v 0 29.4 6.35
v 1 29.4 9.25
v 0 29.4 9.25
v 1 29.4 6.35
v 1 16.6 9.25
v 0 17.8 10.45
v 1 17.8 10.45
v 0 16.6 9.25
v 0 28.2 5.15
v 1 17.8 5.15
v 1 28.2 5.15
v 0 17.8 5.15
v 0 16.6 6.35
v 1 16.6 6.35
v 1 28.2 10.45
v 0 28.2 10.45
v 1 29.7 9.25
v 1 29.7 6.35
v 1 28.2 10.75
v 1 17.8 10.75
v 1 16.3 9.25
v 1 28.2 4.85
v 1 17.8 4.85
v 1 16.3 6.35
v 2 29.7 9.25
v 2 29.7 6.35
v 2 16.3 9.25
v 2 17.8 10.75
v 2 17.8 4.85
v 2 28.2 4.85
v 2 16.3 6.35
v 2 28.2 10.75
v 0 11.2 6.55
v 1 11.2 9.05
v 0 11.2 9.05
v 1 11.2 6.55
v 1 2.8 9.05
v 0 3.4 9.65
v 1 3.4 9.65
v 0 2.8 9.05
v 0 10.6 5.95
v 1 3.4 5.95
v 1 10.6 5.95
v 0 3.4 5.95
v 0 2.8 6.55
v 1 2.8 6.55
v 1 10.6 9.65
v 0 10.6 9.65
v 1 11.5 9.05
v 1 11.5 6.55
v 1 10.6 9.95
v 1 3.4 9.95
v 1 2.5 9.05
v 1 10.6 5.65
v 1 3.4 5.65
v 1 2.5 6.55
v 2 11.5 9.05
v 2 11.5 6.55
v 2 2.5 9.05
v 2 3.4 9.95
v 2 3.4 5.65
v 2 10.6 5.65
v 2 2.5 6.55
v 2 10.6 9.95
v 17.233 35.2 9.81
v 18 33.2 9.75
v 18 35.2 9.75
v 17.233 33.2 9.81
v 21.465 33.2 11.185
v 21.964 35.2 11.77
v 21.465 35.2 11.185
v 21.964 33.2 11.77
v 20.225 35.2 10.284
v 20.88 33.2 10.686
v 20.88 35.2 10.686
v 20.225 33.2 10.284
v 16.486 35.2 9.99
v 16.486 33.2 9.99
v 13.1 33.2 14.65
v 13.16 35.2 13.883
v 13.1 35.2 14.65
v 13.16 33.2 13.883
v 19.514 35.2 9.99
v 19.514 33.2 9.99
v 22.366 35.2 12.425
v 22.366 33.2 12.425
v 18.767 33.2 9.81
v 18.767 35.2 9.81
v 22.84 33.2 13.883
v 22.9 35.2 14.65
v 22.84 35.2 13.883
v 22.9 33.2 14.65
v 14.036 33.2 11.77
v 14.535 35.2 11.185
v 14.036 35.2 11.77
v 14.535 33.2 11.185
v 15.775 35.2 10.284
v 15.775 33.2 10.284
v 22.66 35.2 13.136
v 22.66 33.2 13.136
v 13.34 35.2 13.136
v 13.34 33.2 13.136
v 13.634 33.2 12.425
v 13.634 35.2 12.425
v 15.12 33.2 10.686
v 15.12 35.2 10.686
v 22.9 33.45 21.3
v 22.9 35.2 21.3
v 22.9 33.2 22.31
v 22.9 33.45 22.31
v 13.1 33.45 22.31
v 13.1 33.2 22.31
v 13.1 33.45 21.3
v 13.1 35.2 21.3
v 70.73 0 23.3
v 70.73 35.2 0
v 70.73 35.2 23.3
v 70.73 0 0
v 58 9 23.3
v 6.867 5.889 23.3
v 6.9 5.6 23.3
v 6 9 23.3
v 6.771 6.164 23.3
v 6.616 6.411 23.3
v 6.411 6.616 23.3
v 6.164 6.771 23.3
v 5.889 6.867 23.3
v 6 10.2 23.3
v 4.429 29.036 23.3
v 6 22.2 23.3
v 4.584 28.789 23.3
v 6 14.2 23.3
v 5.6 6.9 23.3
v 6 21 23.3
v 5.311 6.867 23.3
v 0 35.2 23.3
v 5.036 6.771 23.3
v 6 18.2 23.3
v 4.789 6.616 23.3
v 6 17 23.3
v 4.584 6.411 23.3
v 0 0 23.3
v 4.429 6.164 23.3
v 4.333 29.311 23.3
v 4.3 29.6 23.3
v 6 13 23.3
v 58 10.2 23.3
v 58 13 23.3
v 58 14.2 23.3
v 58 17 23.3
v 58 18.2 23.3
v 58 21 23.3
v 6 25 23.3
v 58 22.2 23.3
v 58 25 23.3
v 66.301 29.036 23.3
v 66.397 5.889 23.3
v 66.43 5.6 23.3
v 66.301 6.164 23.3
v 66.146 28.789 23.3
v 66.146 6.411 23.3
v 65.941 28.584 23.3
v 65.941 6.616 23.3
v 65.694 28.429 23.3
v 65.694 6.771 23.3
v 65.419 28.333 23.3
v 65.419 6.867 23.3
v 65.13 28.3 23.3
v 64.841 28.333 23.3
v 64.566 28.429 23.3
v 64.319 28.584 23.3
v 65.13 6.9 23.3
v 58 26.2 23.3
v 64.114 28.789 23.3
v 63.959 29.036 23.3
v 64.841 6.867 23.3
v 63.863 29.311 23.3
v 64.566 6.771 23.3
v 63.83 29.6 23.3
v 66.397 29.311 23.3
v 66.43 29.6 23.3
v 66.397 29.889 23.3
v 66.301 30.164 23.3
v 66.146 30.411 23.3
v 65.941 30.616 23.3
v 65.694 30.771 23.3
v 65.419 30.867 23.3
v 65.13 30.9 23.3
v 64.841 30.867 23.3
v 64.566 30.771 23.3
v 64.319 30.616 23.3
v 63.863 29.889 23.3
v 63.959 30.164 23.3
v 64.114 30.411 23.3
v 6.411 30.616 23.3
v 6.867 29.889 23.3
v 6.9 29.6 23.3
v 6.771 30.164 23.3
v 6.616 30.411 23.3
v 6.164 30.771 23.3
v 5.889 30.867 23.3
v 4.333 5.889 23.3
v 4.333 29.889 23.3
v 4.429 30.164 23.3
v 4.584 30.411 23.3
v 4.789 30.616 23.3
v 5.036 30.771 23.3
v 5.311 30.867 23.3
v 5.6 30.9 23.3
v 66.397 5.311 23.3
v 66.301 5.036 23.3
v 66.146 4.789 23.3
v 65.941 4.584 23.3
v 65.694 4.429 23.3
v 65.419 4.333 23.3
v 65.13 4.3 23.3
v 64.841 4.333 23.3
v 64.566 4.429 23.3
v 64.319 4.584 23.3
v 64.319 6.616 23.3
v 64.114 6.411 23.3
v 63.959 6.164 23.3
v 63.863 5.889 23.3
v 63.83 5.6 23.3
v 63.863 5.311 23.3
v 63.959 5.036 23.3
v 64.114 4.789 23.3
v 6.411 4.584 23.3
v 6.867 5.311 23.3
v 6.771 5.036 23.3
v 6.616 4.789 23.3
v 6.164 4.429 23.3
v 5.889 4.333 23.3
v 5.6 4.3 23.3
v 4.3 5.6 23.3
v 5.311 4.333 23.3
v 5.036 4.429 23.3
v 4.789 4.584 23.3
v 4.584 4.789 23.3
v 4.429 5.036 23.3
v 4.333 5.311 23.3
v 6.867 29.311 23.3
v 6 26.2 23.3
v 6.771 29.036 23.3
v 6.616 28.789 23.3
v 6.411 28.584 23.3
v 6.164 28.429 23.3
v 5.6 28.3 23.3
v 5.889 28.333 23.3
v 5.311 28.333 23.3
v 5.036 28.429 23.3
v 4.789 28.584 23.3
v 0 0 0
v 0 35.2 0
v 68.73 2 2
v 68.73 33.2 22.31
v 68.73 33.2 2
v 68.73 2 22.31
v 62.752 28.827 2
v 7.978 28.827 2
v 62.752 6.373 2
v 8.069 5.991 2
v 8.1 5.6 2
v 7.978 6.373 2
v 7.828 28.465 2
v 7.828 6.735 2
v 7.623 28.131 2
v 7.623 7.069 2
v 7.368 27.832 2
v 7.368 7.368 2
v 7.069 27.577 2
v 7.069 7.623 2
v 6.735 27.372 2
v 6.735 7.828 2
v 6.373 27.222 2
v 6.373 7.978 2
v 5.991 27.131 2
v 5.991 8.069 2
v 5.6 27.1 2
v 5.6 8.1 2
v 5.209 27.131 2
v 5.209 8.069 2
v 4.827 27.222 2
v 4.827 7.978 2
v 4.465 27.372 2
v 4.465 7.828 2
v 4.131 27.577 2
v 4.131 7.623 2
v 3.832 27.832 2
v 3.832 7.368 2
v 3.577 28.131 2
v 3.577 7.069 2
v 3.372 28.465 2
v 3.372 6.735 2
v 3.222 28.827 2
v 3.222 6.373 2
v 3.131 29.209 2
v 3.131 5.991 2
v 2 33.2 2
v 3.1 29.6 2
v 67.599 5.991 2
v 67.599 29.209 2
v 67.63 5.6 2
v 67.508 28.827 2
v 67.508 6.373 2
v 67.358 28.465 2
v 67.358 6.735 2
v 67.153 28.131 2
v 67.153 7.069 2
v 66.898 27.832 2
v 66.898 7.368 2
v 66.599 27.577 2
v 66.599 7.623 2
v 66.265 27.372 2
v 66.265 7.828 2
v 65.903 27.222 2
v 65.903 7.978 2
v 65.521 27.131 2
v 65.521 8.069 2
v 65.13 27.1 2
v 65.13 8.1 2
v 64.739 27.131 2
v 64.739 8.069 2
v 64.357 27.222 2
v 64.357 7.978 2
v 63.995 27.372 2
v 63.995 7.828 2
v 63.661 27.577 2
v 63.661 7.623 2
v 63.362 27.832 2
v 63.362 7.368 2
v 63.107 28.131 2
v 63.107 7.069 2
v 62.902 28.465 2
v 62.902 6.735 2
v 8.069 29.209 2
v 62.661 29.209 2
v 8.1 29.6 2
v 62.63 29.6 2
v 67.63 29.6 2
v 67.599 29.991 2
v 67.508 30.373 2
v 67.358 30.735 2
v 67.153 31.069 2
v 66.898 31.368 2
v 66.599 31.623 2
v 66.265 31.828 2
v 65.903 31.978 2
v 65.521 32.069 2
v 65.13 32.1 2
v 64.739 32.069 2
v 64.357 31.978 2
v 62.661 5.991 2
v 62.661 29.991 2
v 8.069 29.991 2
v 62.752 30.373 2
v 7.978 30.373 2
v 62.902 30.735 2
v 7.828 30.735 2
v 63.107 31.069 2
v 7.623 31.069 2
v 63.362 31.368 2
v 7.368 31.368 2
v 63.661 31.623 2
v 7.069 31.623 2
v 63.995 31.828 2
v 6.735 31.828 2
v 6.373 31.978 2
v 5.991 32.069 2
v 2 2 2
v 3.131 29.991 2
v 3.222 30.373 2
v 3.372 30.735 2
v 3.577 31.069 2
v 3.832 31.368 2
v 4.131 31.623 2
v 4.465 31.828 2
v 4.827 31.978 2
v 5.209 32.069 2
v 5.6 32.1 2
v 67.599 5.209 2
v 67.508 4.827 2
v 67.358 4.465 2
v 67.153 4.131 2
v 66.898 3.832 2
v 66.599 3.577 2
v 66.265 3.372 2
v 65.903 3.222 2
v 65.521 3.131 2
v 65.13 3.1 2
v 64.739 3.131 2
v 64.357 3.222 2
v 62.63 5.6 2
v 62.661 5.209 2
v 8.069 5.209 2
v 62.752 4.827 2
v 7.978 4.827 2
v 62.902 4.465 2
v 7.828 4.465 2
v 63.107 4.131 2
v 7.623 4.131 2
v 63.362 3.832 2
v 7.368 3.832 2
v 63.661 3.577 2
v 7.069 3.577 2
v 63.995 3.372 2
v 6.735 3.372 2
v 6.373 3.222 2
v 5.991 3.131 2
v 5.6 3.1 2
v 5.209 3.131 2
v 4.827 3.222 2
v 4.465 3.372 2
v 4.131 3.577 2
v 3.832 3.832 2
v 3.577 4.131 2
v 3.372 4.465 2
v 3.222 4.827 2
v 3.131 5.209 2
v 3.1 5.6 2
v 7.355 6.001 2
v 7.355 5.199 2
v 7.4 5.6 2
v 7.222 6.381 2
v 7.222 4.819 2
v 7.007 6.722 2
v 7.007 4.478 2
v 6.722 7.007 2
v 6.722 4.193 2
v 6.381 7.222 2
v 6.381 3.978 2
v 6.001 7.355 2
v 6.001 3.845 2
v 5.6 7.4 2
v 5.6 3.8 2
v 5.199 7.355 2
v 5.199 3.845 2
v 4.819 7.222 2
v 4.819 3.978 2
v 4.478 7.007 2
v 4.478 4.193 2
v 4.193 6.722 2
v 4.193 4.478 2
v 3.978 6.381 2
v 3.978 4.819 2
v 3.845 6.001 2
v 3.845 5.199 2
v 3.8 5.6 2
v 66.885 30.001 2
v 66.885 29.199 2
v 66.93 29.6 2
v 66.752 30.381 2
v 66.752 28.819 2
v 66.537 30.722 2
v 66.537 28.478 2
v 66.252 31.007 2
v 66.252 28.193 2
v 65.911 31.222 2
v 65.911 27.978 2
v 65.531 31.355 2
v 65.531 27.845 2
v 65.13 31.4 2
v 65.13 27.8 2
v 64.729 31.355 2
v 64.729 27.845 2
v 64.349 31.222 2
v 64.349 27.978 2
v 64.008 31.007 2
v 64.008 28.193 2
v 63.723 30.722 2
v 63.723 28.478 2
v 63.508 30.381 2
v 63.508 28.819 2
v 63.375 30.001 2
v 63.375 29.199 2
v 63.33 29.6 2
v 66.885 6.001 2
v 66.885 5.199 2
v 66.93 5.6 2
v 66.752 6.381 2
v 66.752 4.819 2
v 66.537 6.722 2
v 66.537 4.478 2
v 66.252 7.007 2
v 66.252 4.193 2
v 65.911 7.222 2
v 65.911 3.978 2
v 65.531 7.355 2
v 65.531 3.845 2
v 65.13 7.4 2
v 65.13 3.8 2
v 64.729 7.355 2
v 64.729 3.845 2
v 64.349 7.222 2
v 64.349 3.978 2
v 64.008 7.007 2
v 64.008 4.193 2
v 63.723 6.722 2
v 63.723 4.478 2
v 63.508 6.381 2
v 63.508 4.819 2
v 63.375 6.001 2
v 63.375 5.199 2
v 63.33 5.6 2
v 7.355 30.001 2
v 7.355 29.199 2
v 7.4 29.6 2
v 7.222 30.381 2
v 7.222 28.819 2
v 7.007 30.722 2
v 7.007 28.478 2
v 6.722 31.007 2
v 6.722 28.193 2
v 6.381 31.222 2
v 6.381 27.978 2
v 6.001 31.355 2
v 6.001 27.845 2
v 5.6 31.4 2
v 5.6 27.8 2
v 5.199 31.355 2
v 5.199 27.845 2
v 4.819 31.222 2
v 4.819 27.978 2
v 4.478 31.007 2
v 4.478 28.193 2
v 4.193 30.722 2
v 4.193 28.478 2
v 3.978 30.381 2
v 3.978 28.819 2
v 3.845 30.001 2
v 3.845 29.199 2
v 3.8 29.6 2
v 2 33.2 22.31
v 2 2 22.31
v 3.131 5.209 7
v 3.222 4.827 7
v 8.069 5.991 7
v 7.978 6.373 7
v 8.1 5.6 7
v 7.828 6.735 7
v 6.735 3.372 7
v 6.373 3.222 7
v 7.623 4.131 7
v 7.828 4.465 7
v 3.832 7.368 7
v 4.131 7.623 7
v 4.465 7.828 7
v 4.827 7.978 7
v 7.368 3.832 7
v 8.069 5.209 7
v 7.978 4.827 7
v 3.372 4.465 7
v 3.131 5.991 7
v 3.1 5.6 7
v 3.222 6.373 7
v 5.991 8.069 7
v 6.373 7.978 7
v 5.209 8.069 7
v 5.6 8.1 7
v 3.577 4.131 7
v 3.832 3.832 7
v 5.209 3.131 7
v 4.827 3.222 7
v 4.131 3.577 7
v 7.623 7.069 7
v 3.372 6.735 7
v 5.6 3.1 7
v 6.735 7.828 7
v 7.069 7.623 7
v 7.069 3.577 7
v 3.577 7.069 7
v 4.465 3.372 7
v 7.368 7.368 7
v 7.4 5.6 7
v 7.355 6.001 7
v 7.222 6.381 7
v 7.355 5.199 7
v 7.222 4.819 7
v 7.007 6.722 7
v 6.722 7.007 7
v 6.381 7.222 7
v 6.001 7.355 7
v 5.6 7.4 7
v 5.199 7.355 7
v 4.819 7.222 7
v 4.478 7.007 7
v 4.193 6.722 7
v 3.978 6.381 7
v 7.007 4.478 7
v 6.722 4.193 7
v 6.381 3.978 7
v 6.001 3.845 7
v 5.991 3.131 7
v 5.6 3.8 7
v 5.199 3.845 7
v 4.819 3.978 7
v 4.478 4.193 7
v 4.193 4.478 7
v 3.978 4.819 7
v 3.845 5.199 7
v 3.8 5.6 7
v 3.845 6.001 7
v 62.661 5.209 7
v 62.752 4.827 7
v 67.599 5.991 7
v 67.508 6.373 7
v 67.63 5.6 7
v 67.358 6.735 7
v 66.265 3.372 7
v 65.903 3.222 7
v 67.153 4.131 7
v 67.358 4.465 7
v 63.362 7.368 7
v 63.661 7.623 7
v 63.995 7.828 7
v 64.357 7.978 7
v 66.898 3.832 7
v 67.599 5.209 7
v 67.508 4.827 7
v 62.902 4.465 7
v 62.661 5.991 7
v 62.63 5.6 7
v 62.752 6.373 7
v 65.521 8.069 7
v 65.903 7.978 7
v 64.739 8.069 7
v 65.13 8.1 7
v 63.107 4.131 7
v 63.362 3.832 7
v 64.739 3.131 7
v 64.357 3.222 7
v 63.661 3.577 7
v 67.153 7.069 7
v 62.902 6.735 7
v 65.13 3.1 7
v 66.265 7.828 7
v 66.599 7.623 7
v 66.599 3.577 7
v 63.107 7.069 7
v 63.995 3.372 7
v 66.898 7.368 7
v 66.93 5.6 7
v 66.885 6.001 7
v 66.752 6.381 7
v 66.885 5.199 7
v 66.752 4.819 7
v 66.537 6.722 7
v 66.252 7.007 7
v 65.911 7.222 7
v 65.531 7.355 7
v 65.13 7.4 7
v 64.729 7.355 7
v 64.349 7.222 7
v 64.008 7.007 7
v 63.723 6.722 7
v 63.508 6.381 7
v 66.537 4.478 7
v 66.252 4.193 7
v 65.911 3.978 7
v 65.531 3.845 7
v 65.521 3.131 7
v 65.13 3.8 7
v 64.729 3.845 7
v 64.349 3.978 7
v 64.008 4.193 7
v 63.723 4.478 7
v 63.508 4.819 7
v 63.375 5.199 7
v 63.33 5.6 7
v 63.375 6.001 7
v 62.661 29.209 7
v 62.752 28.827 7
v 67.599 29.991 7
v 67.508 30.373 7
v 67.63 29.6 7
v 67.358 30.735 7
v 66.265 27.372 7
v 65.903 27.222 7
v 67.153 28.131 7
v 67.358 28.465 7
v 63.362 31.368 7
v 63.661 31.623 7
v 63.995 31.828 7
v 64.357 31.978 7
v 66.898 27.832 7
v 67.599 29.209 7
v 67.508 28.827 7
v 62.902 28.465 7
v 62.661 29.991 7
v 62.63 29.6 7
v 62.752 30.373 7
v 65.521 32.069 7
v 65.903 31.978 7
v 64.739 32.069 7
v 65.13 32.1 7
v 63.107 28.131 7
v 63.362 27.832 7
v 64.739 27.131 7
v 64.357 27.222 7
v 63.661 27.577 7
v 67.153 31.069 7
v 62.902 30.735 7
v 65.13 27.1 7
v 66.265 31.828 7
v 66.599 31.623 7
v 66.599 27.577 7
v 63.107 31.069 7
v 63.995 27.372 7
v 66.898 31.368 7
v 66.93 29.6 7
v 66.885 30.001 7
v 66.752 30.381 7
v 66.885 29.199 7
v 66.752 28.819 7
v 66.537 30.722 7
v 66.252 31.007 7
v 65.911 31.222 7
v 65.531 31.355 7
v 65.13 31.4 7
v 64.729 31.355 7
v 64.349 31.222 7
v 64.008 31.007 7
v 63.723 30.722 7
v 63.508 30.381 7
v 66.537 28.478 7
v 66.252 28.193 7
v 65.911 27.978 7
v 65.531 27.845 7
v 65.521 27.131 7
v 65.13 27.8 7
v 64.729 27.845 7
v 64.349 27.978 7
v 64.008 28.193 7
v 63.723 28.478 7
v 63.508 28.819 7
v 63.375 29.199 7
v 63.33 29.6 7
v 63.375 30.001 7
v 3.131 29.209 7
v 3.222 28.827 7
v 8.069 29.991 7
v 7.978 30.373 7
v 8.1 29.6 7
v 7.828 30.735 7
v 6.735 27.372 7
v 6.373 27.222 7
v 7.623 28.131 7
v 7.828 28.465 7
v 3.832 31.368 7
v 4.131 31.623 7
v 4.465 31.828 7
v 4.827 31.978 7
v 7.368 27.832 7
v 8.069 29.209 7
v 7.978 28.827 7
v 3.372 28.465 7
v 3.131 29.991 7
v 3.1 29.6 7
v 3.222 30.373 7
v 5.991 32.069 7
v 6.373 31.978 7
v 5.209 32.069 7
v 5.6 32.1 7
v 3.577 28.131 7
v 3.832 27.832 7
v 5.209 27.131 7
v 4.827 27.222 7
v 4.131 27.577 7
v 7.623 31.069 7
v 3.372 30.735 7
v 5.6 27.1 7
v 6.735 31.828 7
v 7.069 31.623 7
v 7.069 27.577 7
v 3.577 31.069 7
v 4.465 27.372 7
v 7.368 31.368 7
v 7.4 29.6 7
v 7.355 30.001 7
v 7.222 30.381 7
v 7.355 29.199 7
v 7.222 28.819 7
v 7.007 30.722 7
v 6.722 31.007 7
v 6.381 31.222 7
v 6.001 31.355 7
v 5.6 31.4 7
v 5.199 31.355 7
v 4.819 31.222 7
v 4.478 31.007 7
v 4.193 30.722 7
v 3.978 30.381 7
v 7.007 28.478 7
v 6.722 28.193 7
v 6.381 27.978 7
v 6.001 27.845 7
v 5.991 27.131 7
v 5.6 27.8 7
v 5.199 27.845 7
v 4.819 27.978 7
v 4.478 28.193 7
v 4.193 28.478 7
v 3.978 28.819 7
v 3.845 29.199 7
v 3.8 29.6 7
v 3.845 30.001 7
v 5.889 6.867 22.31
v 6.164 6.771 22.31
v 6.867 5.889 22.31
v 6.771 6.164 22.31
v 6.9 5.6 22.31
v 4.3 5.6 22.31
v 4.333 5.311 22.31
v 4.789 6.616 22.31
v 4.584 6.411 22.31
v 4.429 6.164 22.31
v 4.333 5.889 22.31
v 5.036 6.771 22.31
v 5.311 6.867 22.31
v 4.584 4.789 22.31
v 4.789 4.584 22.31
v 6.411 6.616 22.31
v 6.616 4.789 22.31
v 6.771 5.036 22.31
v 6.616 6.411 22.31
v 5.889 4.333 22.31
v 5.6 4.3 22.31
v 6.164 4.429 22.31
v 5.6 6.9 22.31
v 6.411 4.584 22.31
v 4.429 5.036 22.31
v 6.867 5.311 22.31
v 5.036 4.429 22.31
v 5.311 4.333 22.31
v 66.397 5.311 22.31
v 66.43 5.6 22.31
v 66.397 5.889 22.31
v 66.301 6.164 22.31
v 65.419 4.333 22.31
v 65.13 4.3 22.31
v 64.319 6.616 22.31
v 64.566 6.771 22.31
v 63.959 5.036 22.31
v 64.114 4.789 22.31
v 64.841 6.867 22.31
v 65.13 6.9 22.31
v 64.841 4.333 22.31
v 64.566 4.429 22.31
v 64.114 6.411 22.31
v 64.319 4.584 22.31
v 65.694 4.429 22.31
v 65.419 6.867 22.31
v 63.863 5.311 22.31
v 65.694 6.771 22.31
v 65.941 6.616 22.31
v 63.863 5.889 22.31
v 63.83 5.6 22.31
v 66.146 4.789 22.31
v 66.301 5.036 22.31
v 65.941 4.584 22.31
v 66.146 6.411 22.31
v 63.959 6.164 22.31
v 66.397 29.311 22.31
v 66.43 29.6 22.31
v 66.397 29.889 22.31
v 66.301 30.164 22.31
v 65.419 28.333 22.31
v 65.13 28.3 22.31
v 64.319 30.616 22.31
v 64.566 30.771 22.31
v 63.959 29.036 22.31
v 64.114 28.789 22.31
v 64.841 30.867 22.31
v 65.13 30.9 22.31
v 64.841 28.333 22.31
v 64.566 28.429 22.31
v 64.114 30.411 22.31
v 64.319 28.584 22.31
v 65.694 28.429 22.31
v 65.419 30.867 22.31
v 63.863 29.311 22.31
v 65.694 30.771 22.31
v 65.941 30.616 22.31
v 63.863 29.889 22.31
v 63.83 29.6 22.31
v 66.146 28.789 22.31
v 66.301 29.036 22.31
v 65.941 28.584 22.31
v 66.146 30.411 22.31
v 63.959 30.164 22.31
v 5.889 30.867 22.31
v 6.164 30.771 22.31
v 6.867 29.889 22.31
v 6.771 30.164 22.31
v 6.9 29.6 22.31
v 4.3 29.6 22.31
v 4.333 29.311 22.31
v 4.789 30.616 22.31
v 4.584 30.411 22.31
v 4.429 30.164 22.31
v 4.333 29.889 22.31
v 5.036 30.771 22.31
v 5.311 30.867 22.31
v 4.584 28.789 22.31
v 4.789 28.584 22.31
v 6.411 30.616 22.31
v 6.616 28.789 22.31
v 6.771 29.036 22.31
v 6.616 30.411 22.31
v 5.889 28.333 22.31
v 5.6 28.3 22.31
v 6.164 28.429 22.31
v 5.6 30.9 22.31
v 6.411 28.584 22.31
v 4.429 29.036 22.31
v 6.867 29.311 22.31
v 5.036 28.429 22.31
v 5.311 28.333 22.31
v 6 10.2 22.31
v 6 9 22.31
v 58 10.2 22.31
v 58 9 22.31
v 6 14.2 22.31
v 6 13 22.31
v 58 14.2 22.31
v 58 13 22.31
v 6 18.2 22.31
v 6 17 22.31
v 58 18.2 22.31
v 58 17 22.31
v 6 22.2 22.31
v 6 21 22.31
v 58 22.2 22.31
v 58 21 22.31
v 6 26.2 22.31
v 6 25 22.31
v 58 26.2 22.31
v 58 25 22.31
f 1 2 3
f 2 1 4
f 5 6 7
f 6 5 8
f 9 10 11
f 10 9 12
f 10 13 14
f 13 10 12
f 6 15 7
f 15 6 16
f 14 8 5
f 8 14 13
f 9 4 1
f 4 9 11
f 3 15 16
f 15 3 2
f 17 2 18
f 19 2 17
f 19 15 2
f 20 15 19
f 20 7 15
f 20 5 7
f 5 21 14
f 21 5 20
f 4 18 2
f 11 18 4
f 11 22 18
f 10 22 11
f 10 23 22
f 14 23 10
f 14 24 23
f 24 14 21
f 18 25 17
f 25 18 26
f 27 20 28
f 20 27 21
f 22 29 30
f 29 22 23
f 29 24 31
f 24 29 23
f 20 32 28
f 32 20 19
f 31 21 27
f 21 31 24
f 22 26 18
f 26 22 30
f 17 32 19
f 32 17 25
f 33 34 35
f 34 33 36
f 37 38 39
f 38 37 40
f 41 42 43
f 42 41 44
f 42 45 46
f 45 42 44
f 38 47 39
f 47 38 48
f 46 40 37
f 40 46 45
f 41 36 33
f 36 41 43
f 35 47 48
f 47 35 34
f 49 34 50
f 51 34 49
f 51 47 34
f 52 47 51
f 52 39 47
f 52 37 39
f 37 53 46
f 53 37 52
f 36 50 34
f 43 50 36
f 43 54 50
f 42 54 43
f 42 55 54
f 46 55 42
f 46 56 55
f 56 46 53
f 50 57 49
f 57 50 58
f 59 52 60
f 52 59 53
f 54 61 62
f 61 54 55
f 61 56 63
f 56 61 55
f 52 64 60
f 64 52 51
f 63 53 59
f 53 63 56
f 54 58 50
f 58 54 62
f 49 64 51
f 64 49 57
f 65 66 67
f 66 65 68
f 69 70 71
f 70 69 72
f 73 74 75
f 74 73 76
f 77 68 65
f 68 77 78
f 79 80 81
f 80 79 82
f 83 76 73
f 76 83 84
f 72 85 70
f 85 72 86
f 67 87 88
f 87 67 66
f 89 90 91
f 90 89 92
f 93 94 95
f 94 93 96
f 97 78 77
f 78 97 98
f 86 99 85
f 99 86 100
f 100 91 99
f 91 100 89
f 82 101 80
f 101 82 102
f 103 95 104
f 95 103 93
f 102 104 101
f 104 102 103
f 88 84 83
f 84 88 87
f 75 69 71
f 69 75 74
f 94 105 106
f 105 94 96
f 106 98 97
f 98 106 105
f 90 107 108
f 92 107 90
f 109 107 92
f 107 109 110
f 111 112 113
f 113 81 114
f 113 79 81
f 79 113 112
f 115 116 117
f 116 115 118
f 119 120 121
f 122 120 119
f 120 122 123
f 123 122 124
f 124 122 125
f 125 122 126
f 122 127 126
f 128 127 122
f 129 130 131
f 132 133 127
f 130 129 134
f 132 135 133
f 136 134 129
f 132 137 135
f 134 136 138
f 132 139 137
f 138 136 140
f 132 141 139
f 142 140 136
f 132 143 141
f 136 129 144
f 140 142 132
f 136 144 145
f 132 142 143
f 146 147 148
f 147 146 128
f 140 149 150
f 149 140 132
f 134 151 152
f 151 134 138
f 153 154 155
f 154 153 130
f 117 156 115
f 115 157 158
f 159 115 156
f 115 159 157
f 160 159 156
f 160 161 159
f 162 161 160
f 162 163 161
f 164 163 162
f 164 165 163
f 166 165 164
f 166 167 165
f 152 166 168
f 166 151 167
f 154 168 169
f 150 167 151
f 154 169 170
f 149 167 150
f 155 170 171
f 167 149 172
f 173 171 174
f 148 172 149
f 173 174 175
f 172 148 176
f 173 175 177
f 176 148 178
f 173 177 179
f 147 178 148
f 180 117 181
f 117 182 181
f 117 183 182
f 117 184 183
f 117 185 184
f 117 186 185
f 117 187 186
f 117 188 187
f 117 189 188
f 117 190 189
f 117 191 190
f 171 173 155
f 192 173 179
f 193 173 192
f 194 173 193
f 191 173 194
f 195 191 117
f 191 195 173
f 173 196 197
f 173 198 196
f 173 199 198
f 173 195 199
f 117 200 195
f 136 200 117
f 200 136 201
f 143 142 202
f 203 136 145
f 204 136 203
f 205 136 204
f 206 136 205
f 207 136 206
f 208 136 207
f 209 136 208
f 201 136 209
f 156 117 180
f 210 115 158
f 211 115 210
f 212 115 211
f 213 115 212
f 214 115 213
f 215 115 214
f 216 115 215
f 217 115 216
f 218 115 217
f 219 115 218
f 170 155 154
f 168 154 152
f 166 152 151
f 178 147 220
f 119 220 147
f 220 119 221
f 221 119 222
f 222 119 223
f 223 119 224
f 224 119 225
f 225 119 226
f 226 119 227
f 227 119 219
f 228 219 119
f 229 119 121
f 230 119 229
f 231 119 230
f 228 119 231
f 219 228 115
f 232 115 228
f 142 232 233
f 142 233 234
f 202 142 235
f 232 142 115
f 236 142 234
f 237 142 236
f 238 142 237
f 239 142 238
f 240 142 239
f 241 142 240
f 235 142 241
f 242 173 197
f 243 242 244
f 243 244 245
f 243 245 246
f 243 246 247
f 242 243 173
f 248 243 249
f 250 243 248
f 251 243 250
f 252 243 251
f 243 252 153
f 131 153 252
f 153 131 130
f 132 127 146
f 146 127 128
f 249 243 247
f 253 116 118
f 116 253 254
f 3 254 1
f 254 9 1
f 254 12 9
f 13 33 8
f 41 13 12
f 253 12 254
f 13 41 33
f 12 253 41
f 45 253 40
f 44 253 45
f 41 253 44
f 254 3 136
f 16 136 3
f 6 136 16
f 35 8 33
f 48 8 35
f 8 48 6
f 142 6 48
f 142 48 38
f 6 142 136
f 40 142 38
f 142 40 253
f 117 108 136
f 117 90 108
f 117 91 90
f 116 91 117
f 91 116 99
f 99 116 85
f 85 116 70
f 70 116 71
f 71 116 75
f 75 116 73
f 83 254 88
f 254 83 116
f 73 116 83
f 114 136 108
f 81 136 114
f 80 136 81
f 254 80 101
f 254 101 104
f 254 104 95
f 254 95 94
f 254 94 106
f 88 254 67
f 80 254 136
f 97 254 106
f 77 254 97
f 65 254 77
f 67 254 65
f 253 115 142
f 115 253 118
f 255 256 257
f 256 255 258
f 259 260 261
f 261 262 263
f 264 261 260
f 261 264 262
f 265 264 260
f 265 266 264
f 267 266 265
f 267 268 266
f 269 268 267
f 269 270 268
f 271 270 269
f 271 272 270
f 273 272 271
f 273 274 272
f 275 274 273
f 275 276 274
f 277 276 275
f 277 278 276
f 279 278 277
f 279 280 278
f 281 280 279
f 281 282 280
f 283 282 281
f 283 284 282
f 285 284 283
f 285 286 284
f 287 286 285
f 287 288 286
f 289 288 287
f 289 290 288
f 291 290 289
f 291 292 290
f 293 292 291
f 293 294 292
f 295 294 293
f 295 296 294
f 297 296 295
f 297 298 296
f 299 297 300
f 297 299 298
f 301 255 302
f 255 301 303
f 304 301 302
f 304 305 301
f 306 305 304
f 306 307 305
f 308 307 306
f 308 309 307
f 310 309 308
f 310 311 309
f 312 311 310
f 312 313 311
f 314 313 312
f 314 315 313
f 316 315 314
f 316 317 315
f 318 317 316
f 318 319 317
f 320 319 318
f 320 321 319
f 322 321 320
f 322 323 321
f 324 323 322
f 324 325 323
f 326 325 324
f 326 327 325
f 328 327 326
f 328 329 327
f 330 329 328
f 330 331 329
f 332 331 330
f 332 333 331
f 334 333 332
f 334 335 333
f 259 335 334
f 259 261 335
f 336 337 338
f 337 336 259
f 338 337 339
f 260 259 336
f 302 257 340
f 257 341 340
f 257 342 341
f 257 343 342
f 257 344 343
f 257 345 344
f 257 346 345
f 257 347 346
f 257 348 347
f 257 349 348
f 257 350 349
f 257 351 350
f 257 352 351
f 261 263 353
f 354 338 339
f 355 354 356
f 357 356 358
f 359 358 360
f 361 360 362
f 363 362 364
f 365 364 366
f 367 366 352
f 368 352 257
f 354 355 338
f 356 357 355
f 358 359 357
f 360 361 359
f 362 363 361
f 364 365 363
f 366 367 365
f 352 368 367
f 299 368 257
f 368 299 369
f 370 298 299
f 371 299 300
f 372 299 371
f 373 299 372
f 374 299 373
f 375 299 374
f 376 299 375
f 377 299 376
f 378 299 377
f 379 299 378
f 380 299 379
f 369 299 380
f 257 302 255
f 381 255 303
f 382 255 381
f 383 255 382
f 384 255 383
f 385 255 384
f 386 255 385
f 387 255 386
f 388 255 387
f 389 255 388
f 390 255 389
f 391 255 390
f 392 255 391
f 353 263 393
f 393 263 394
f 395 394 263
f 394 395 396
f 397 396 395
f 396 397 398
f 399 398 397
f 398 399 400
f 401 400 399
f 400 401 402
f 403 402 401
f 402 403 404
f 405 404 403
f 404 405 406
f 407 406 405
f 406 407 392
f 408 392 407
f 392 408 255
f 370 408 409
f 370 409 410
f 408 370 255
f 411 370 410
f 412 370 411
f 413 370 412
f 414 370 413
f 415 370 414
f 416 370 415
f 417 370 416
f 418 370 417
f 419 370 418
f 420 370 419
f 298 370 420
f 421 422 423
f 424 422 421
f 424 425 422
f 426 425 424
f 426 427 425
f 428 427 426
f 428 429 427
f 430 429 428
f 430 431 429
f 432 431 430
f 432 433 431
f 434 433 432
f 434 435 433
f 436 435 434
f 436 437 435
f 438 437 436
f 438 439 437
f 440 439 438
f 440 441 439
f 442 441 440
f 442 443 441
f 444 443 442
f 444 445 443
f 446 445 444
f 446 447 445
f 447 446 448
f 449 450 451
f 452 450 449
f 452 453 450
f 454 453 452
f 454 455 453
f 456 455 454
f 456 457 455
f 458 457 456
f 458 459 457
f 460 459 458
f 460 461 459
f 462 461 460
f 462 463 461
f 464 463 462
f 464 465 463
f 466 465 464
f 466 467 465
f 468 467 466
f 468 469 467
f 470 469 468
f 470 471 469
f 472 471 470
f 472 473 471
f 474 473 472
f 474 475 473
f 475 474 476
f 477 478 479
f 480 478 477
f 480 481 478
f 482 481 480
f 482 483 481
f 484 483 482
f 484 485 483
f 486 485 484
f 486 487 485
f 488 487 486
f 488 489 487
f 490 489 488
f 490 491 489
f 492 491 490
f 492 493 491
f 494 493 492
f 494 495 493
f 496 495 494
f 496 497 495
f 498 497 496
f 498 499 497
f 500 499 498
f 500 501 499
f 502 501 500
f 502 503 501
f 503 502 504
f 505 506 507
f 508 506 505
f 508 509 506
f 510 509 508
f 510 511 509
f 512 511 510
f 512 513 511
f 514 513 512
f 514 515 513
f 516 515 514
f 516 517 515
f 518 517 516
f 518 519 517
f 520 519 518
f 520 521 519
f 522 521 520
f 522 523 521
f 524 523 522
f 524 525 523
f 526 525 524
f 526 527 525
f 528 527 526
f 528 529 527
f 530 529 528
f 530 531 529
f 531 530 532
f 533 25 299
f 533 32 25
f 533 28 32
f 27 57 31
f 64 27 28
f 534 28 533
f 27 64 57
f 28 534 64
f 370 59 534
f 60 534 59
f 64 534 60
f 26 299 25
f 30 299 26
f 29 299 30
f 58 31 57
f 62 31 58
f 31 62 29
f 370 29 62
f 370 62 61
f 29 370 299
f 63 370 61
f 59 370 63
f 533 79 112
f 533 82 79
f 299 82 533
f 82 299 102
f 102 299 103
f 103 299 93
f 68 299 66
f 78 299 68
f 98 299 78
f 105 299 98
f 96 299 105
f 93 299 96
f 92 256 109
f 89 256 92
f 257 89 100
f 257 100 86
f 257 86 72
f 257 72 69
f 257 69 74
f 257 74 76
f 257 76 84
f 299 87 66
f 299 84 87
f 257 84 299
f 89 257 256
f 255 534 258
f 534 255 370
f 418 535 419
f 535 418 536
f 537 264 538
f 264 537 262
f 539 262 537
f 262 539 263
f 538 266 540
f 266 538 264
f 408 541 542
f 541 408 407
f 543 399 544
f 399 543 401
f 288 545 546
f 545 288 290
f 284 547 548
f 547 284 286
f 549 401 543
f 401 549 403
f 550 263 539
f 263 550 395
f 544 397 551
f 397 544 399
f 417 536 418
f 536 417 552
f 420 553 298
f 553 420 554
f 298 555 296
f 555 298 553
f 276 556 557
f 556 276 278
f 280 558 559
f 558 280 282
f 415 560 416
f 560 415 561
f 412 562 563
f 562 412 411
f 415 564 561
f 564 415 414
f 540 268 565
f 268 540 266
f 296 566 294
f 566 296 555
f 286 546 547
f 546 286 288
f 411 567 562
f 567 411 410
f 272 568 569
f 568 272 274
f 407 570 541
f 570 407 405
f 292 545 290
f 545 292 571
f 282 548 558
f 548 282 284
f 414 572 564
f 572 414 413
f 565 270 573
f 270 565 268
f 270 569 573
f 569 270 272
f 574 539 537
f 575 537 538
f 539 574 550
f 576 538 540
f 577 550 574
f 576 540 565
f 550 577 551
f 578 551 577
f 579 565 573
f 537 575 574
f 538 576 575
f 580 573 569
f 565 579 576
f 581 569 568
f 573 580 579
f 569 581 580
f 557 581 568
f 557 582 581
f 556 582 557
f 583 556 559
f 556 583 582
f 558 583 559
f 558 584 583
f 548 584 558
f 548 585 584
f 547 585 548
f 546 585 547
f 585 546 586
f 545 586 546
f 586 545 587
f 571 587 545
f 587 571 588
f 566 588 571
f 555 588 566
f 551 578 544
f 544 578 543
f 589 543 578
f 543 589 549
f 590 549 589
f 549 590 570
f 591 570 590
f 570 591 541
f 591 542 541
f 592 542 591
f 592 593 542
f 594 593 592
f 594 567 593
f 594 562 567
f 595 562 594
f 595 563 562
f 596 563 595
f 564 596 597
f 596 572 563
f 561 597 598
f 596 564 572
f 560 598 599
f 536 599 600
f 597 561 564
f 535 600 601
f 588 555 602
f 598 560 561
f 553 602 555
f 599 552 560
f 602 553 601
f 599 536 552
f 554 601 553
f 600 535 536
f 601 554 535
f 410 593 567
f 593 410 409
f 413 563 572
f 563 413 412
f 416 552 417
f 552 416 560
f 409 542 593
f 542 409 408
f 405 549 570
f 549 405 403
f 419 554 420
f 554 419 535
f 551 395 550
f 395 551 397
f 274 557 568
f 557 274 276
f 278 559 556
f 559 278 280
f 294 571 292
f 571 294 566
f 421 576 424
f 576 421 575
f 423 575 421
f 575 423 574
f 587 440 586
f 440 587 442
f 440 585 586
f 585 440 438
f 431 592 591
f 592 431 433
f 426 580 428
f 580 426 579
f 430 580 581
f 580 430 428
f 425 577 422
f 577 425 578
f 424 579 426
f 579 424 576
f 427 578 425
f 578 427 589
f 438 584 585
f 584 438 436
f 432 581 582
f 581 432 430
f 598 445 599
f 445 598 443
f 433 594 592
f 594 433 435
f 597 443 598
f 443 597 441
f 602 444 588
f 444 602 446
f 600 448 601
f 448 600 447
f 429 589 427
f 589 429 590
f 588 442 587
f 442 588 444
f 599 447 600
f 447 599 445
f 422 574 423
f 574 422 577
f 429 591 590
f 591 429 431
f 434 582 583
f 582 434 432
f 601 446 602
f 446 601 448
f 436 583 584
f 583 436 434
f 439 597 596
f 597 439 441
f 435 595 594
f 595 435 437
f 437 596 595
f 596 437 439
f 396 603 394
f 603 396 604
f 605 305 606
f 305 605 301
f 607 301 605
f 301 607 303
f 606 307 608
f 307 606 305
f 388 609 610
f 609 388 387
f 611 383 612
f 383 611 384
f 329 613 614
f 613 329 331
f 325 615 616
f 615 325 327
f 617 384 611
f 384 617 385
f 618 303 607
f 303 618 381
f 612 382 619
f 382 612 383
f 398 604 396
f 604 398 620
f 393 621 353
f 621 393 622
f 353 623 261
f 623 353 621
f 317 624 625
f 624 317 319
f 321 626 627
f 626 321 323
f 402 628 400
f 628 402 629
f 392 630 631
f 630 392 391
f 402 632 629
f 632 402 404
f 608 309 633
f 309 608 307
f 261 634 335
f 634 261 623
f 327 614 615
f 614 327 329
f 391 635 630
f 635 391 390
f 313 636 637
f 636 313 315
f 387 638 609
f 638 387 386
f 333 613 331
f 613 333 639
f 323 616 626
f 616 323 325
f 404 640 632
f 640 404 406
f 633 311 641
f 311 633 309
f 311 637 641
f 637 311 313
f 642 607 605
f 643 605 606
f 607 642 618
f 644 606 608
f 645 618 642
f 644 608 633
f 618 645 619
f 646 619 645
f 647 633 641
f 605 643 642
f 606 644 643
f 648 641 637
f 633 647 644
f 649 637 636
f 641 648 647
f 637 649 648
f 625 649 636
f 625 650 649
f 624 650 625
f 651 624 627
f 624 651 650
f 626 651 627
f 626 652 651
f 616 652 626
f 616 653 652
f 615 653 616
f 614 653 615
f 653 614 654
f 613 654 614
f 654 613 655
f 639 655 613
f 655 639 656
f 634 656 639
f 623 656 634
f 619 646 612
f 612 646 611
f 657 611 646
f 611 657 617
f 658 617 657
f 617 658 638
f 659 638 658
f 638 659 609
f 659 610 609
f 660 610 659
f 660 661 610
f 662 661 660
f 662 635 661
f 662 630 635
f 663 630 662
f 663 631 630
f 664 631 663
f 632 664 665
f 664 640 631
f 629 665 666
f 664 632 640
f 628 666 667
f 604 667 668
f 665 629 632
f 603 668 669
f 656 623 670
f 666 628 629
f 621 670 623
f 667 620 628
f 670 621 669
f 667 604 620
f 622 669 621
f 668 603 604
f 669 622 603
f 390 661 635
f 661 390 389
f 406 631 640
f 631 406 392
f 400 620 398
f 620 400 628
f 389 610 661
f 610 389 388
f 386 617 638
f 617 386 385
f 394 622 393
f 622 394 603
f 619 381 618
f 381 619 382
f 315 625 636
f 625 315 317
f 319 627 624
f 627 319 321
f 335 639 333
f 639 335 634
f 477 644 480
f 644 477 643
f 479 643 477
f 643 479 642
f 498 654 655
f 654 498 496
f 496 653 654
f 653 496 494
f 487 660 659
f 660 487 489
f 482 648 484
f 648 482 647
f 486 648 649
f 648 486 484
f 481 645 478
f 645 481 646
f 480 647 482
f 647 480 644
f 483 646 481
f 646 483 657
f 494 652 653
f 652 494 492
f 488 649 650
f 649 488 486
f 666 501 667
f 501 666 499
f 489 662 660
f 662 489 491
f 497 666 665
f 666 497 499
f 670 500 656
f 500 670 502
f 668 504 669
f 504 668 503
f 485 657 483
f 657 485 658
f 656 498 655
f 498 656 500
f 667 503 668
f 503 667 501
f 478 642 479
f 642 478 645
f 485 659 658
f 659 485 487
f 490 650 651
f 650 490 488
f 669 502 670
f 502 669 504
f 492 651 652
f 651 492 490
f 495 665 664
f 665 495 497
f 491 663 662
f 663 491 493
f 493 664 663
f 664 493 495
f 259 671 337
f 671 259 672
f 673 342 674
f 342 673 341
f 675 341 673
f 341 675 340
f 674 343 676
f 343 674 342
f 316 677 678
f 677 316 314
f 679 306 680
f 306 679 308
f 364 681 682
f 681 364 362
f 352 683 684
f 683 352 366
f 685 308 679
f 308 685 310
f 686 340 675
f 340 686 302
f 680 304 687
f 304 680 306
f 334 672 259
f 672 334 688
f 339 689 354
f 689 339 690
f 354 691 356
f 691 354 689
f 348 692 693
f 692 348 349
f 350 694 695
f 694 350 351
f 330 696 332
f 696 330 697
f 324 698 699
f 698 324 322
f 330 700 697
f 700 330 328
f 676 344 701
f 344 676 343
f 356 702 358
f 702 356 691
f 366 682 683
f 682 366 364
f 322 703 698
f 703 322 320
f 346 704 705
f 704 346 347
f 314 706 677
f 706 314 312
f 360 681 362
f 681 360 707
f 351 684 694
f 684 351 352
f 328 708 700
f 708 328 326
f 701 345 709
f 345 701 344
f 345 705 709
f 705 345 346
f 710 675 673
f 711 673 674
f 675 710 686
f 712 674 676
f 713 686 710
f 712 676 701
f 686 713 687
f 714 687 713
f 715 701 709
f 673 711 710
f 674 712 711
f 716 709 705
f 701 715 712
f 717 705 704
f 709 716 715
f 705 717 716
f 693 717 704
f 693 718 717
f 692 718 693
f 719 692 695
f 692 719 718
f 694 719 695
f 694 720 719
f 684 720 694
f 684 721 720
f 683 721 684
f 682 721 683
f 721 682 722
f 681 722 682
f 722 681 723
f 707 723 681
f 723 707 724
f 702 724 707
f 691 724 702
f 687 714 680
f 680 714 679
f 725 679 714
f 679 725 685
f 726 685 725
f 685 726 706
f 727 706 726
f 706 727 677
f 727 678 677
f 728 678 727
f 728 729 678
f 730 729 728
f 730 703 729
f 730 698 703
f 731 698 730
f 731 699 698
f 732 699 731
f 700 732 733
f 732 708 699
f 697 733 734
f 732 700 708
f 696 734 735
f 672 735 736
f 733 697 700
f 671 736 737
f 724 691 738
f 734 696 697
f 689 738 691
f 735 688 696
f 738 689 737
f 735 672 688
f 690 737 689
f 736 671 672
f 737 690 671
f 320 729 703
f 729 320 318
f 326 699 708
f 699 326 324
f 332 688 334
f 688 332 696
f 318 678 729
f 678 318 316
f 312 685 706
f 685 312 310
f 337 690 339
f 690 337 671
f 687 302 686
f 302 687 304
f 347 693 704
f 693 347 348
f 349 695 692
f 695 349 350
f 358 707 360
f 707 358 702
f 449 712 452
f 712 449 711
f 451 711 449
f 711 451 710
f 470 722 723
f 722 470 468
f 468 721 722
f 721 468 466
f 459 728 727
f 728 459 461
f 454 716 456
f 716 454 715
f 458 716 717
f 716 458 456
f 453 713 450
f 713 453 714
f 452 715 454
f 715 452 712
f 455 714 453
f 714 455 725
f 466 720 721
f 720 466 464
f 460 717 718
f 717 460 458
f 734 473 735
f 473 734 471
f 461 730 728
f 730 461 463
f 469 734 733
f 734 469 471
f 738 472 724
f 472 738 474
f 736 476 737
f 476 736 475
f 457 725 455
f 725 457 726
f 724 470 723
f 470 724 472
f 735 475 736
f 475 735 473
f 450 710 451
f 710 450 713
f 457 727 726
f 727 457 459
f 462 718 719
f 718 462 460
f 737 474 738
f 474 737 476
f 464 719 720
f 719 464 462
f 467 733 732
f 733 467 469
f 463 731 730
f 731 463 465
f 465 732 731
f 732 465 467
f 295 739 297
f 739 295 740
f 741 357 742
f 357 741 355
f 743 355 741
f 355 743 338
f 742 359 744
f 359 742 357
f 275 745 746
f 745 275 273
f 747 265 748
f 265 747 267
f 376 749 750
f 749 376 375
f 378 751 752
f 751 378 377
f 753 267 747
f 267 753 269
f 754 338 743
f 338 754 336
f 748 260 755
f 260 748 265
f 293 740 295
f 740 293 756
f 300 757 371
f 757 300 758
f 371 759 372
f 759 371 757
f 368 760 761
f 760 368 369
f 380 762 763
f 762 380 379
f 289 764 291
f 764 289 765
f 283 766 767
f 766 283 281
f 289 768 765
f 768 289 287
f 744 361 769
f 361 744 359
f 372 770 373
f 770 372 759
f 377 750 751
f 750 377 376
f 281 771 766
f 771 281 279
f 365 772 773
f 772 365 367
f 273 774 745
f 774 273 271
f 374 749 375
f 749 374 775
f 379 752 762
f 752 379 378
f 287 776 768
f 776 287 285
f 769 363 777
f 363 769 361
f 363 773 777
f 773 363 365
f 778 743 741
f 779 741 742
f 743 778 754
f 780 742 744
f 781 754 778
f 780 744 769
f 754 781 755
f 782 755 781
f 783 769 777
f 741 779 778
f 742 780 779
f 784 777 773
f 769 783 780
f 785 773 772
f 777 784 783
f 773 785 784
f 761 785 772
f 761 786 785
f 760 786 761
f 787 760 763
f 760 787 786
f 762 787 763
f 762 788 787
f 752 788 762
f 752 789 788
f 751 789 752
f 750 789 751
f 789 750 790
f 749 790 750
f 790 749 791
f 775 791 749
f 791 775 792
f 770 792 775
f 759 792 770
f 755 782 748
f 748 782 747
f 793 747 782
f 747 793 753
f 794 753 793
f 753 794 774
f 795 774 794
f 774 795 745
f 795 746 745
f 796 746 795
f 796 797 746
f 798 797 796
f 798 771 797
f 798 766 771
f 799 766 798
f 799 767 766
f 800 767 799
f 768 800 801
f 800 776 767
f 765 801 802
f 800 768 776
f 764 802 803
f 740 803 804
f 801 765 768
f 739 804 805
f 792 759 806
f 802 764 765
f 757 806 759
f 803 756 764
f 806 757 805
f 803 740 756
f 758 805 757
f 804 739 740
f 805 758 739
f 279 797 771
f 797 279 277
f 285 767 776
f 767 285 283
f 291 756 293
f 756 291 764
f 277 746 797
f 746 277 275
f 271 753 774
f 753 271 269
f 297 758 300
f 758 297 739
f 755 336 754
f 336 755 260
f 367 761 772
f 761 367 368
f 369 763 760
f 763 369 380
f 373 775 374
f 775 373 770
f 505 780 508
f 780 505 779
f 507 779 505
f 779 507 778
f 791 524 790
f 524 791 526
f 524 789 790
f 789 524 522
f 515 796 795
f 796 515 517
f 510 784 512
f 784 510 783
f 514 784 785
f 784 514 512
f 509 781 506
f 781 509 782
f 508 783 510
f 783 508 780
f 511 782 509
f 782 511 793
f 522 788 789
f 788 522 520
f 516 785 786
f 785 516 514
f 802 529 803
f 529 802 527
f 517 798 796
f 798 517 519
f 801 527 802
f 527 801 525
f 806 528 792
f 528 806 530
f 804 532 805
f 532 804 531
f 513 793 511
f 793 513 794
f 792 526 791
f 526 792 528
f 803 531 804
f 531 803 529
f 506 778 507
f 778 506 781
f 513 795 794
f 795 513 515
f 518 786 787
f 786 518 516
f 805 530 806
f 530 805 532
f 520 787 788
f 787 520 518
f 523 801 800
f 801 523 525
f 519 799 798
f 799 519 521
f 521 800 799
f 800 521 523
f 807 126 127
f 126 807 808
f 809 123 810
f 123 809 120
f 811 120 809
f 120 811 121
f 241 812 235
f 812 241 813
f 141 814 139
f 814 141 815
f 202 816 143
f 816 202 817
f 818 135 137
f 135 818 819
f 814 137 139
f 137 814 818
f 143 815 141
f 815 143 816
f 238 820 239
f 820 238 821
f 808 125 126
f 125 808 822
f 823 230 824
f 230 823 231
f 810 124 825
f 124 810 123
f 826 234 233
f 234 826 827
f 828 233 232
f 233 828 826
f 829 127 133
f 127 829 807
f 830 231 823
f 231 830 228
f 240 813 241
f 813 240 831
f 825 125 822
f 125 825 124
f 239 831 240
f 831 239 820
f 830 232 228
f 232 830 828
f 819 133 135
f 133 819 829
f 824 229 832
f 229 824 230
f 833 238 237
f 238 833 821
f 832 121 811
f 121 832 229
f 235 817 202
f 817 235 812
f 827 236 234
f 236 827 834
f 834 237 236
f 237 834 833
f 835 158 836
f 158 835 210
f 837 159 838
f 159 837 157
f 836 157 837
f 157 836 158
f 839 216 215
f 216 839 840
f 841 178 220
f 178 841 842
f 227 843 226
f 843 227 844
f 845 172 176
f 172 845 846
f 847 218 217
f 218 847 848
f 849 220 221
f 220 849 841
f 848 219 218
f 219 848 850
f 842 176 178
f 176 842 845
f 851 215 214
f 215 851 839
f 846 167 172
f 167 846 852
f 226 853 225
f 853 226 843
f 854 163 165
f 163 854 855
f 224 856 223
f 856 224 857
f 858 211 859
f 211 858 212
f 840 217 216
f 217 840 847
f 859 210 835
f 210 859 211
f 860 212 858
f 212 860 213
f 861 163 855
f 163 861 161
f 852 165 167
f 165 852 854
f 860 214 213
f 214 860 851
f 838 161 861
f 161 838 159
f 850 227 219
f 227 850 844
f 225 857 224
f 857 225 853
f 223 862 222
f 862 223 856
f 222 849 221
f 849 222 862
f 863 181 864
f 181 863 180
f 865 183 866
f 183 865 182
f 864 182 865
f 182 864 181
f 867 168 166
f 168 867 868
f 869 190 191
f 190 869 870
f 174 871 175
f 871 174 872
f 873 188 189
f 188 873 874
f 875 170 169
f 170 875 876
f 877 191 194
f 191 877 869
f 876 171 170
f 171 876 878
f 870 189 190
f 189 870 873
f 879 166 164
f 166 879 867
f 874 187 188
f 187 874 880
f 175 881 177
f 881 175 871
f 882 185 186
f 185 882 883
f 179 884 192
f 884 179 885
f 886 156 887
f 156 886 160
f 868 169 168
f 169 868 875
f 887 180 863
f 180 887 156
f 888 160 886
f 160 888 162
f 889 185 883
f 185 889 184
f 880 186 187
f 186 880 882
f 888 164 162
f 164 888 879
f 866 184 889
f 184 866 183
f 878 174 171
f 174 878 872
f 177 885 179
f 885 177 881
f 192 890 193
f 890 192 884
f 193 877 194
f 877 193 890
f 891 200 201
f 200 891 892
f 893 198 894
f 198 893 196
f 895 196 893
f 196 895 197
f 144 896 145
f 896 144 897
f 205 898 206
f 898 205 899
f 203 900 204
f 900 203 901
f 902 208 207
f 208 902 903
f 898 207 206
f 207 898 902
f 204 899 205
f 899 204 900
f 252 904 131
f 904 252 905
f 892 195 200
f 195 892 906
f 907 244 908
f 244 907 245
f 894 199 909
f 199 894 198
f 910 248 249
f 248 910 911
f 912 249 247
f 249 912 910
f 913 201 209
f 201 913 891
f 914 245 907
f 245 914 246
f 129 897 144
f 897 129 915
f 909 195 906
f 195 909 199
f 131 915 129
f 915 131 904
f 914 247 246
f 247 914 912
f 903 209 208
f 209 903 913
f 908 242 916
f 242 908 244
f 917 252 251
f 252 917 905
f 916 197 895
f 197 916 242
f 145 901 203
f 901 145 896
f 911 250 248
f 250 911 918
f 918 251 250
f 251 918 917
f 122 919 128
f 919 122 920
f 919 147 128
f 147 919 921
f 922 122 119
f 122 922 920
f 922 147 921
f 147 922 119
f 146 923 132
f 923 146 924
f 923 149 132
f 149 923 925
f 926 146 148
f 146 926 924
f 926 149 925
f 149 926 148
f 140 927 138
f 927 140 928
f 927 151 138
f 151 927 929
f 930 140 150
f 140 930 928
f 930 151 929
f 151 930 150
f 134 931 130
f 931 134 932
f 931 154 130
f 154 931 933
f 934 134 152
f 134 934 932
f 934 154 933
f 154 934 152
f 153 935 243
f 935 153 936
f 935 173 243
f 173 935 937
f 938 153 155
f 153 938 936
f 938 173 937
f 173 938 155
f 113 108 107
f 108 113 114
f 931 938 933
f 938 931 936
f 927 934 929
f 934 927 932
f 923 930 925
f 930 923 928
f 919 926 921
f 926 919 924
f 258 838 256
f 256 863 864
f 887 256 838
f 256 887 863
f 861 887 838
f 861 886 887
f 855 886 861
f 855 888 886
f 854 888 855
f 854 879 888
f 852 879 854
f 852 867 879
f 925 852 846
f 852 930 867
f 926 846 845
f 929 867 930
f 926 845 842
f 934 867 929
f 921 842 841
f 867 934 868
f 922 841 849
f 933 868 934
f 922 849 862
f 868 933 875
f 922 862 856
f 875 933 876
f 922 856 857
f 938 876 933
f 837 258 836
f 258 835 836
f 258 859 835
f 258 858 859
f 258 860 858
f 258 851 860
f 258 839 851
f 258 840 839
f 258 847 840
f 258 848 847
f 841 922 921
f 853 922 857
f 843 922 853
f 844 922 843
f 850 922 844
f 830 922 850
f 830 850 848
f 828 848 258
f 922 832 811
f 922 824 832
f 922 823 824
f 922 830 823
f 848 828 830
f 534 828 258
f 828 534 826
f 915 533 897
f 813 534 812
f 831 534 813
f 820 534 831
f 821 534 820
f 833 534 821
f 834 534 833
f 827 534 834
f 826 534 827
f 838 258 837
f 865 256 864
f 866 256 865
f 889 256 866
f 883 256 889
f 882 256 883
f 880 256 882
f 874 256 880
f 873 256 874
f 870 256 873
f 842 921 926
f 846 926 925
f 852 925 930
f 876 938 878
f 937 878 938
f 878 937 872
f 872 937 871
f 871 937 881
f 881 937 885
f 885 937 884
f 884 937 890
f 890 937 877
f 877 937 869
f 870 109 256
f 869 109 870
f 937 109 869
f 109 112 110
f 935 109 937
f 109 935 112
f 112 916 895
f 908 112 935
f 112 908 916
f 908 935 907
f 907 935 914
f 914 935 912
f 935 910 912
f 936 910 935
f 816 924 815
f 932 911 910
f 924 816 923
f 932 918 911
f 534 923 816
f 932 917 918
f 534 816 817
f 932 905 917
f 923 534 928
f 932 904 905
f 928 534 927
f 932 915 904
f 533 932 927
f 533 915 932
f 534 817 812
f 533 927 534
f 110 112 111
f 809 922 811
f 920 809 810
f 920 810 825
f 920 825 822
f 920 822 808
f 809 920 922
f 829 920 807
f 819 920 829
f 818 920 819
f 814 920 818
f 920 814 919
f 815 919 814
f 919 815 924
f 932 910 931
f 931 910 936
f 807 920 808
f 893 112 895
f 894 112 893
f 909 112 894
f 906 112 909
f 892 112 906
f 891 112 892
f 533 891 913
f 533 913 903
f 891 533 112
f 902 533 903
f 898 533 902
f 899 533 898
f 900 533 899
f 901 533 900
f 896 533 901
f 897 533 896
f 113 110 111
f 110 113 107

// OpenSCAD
//  SELECT PART  
PART = "both"; // ["bottom","top","both"]

//  MAIN PCB DIMENSIONS
board_len = 65.53;         // x
board_wid = 30;            // y
board_thk = 1.6;           // PCB thickness

// Tallest components (above PCB top / below PCB bottom)
comp_bottom = 3.0;
comp_top    = 12.1;        // approx 0.54" total - 1.6 mm PCB

//  PLASTIC THICKNESSES AND CLEARANCES 
wall  = 2.0;
floor = 2.0;
lid   = 2.0;

clear_xy = 0.6;            // side clearance
clear_z  = 0.6;            // vertical breathing room

//  USB PORT 1
// NOTE: "short" => long X wall; "long" => short Y wall (the PCB end)
usb_present = true;
usb_is_typeC = true;       // set false if you switch to USB A sizes
usb_side = "long";
usb_offset_from_left = 21;
usb_wall_clearance   = 0.40;

// USB PORT 2 (Micro USB)
usb2_present = true;
usb2_is_typeC = false;     // micro
usb2_side = "long";
usb2_offset_from_left = 5;
usb2_wall_clearance   = 0.40;

// USB shell sizes
usbC_w=12.0;  usbC_h=4.5;  usbC_depth=6.5;
micro_w=7.6; micro_h=2.9; micro_depth=6.0;

//  SMA ANTENNA 
antenna_bulkhead = true;
sma_on_short_side   = true;        // true => long X wall, false => short Y wall
sma_offset_from_left = 16;
sma_hole_d   = 7.8;                // close to barrel diameter
sma_pocket_d = sma_hole_d + 2;     // width of the U pocket (circle and slot)
sma_flat_clear = 11.0;             // kept for possible hex recess later

//  VENTING 
side_vents = false;
lid_vents  = true;
vent_slot  = [1.2, 12];
vent_pitch = 4.0;

//  LID LIP (filled lid with overlap) 
lid_rabbet_depth = 1.0;
lid_rabbet_clear = 0.25;

//  STANDOFFS AND MOUNTING 
standoff_h=5.0;
standoff_d=5.0;
insert_hole_d=3.6;         // for M2.5 heat set insert
through_hole_d=2.6;        // M2.5 clearance

hole_inset=3.0;
mount_holes=[
  [hole_inset,            hole_inset],
  [board_len-hole_inset,  hole_inset],
  [board_len-hole_inset,  board_wid-hole_inset],
  [hole_inset,            board_wid-hole_inset]
];

//  DERIVED DIMENSIONS 
inner_len = board_len + 2*clear_xy;
inner_wid = board_wid + 2*clear_xy;
body_len  = inner_len + 2*wall;
body_wid  = inner_wid + 2*wall;

base_cavity = floor + standoff_h + board_thk + comp_top + clear_z;
lid_inner   = lid;
body_ht     = base_cavity + lid_inner;

//  Toggles (preview helpers) 
show_pcb_preview = true;   // set false to hide green board
show_usb_markers = false;  // set true to see small spheres at USB centers


//
// Helpers
//
module horiz_slot(len,wid,thk){ cube([len,wid,thk],center=true); }
module pcb_outline(){ cube([board_len,board_wid,board_thk],center=false); }

module standoff(pos,through=false){
  translate([wall+clear_xy+pos[0], wall+clear_xy+pos[1], floor])
  difference(){
    cylinder(h=standoff_h,d=standoff_d,$fn=40);
    translate([0,0,-0.1])
      cylinder(h=standoff_h+0.2, d=(through?through_hole_d:insert_hole_d), $fn=28);
  }
}

//  Rounded rectangle helpers (for USB openings) 
module _roundrect_2d(w,h,r){
  r = min(r, w/2, h/2);
  offset(r=r) square([w-2*r, h-2*r], center=true);
}
module rr_y(w,h,thk,r){ // through Y (long X wall)
  rotate([90,0,0])
    linear_extrude(height=thk, center=true)
      _roundrect_2d(w,h,r);
}
module rr_x(w,h,thk,r){ // through X (short Y wall)
  rotate([0,90,0])
    linear_extrude(height=thk, center=true)
      _roundrect_2d(w,h,r);
}
micro_corner_r = 0.6;
usbC_corner_r  = 1.2;


// USB CUTOUTS (two ports)

module usb_cutout_port(is_typeC, side, offset_from_left, wall_clear){
  usb_w   = is_typeC ? usbC_w : micro_w;
  usb_h   = is_typeC ? usbC_h : micro_h;
  depth   = is_typeC ? usbC_depth : micro_depth;
  slack_w = usb_w + 2*wall_clear;
  slack_h = usb_h + 2*wall_clear;
  cr      = is_typeC ? usbC_corner_r : micro_corner_r;
  flare   = 0.6; // inside relief

  if (side=="short"){ // long X wall => extrude along Y
    x = offset_from_left + wall;
    z = floor + standoff_h + board_thk/2;
    translate([x,-0.01,z]) rr_y(slack_w,slack_h,wall+0.02,cr);
    translate([x, wall + depth/2, z]) rr_y(slack_w+flare,slack_h+flare,depth+2,cr+0.3);
  } else {            // short Y wall => extrude along X
    y = offset_from_left + wall;
    z = floor + standoff_h + board_thk/2;
    translate([-0.01,y,z]) rr_x(slack_h,slack_w,wall+0.02,cr);
    translate([wall + depth/2, y, z]) rr_x(slack_h+flare,slack_w+flare,depth+2,cr+0.3);
  }
}

module usb_cutouts(){
  if (usb_present)
    usb_cutout_port(usb_is_typeC, usb_side, usb_offset_from_left, usb_wall_clearance);
  if (usb2_present)
    usb_cutout_port(usb2_is_typeC, usb2_side, usb2_offset_from_left, usb2_wall_clearance);
}

// Optional USB center markers
module _usb_center_markers(){
  z = floor + standoff_h + board_thk/2;
  if (usb_present){
    if (usb_side=="short")
      translate([usb_offset_from_left+wall, wall/2, z]) color("red") sphere(d=1.8);
    else
      translate([wall/2, usb_offset_from_left+wall, z]) color("red") sphere(d=1.8);
  }
  if (usb2_present){
    if (usb2_side=="short")
      translate([usb2_offset_from_left+wall, wall/2, z]) color("lime") sphere(d=1.8);
    else
      translate([wall/2, usb2_offset_from_left+wall, z]) color("lime") sphere(d=1.8);
  }
}
if (show_usb_markers) %_usb_center_markers();


// SMA HOLE with U pocket

module sma_hole() {
  if (antenna_bulkhead) {

    // vertical center of SMA
    sma_z = floor + standoff_h + board_thk + comp_top/2;

    // rectangle width and extra slot height
    slot_w     = sma_pocket_d;
    slot_extra = 0.5;

    if (sma_on_short_side) {
      // long X wall on far (+Y) side

      x = sma_offset_from_left + wall;
      y_center = body_wid - wall/2;   // middle of wall thickness

      // circular pocket
      translate([x, y_center, sma_z])
        rotate([90,0,0])
          cylinder(h = wall + 0.2, d = sma_pocket_d,
                   center = true, $fn = 40);

      // slot that overlaps the upper part of the circle
      slot_z0 = sma_z;                        // through circle center
      slot_h  = body_ht - slot_z0 + slot_extra;

      translate([x - slot_w/2,
                 y_center - wall/2 - 0.01,
                 slot_z0])
        cube([slot_w, wall + 0.02, slot_h], center = false);

    } else {
      // short Y wall on far (+X) side

      y = sma_offset_from_left + wall;
      x_center = body_len - wall/2;

      // circular pocket
      translate([x_center, y, sma_z])
        rotate([0,90,0])
          cylinder(h = wall + 0.2, d = sma_pocket_d,
                   center = true, $fn = 40);

      // slot that overlaps upper part of the circle
      slot_z0 = sma_z;
      slot_h  = body_ht - slot_z0 + slot_extra;

      translate([x_center - wall/2 - 0.01,
                 y - slot_w/2,
                 slot_z0])
        cube([wall + 0.02, slot_w, slot_h], center = false);
    }
  }
}


// Side vents (slots)

module vent_slots_on_wall(short_side=true){
  len    = short_side ? body_len : body_wid;
  usable = len - 20;
  count  = max(0, floor(usable/vent_pitch));
  for(i=[0:count-1]){
    pos = 10 + (i+0.5)/count * usable;
    if(short_side){
      translate([pos,-0.01, body_ht/2])
        rotate([90,0,0]) horiz_slot(vent_slot[1], vent_slot[0], wall+0.02);
    } else {
      translate([-0.01,pos, body_ht/2])
        rotate([0,90,0]) horiz_slot(vent_slot[1], vent_slot[0], wall+0.02);
    }
  }
}


// Lid vents (grid)

module lid_vent_field(){
  if (lid_vents){
    rows = 5;
    cols = max(0, floor((inner_len-20)/vent_pitch));
    for(r=[0:rows-1]) for(c=[0:cols-1]){
      x = wall+10+c*vent_pitch;
      y = wall + inner_wid/2 - (rows/2 - 0.5)*vent_pitch + r*vent_pitch;
      z = body_ht - lid/2;
      translate([x,y,z])
        cube([vent_slot[1], vent_slot[0], lid+0.02], center=true);
    }
  }
}


// Bottom shell

module bottom_shell(){
  difference(){
    cube([body_len,body_wid,body_ht],center=false); // outer
    translate([wall,wall,lid])
      cube([inner_len,inner_wid,body_ht-lid],center=false); // inner cavity

    usb_cutouts();
    if(side_vents){
      vent_slots_on_wall(true);
      vent_slots_on_wall(false);
    }
    sma_hole();
  }

  // standoffs
  for(p=mount_holes) standoff(p,false);

  // PCB preview
  if (show_pcb_preview)
    %color([0,1,0,0.15])
      translate([wall+clear_xy, wall+clear_xy, floor+standoff_h])
        pcb_outline();
}


// Top lid

module top_lid(){
  difference(){
    translate([0,0,body_ht-lid])
      cube([body_len,body_wid,lid],center=false);

    translate([wall - lid_rabbet_clear,
               wall - lid_rabbet_clear,
               body_ht - lid - 0.01])
      cube([inner_len + 2*lid_rabbet_clear,
            inner_wid + 2*lid_rabbet_clear,
            lid_rabbet_depth + 0.02], center=false);

    for(p=mount_holes)
      translate([wall+clear_xy+p[0], wall+clear_xy+p[1], body_ht-lid-0.01])
        cylinder(h=lid+0.02, d=through_hole_d, $fn=28);

    lid_vent_field();
  }
}


// Render selector

if (PART=="bottom")       color("gainsboro") bottom_shell();
else if (PART=="top")     color("white")     top_lid();
else { color("gainsboro") bottom_shell(); color([1,1,1,0.35]) top_lid(); }
